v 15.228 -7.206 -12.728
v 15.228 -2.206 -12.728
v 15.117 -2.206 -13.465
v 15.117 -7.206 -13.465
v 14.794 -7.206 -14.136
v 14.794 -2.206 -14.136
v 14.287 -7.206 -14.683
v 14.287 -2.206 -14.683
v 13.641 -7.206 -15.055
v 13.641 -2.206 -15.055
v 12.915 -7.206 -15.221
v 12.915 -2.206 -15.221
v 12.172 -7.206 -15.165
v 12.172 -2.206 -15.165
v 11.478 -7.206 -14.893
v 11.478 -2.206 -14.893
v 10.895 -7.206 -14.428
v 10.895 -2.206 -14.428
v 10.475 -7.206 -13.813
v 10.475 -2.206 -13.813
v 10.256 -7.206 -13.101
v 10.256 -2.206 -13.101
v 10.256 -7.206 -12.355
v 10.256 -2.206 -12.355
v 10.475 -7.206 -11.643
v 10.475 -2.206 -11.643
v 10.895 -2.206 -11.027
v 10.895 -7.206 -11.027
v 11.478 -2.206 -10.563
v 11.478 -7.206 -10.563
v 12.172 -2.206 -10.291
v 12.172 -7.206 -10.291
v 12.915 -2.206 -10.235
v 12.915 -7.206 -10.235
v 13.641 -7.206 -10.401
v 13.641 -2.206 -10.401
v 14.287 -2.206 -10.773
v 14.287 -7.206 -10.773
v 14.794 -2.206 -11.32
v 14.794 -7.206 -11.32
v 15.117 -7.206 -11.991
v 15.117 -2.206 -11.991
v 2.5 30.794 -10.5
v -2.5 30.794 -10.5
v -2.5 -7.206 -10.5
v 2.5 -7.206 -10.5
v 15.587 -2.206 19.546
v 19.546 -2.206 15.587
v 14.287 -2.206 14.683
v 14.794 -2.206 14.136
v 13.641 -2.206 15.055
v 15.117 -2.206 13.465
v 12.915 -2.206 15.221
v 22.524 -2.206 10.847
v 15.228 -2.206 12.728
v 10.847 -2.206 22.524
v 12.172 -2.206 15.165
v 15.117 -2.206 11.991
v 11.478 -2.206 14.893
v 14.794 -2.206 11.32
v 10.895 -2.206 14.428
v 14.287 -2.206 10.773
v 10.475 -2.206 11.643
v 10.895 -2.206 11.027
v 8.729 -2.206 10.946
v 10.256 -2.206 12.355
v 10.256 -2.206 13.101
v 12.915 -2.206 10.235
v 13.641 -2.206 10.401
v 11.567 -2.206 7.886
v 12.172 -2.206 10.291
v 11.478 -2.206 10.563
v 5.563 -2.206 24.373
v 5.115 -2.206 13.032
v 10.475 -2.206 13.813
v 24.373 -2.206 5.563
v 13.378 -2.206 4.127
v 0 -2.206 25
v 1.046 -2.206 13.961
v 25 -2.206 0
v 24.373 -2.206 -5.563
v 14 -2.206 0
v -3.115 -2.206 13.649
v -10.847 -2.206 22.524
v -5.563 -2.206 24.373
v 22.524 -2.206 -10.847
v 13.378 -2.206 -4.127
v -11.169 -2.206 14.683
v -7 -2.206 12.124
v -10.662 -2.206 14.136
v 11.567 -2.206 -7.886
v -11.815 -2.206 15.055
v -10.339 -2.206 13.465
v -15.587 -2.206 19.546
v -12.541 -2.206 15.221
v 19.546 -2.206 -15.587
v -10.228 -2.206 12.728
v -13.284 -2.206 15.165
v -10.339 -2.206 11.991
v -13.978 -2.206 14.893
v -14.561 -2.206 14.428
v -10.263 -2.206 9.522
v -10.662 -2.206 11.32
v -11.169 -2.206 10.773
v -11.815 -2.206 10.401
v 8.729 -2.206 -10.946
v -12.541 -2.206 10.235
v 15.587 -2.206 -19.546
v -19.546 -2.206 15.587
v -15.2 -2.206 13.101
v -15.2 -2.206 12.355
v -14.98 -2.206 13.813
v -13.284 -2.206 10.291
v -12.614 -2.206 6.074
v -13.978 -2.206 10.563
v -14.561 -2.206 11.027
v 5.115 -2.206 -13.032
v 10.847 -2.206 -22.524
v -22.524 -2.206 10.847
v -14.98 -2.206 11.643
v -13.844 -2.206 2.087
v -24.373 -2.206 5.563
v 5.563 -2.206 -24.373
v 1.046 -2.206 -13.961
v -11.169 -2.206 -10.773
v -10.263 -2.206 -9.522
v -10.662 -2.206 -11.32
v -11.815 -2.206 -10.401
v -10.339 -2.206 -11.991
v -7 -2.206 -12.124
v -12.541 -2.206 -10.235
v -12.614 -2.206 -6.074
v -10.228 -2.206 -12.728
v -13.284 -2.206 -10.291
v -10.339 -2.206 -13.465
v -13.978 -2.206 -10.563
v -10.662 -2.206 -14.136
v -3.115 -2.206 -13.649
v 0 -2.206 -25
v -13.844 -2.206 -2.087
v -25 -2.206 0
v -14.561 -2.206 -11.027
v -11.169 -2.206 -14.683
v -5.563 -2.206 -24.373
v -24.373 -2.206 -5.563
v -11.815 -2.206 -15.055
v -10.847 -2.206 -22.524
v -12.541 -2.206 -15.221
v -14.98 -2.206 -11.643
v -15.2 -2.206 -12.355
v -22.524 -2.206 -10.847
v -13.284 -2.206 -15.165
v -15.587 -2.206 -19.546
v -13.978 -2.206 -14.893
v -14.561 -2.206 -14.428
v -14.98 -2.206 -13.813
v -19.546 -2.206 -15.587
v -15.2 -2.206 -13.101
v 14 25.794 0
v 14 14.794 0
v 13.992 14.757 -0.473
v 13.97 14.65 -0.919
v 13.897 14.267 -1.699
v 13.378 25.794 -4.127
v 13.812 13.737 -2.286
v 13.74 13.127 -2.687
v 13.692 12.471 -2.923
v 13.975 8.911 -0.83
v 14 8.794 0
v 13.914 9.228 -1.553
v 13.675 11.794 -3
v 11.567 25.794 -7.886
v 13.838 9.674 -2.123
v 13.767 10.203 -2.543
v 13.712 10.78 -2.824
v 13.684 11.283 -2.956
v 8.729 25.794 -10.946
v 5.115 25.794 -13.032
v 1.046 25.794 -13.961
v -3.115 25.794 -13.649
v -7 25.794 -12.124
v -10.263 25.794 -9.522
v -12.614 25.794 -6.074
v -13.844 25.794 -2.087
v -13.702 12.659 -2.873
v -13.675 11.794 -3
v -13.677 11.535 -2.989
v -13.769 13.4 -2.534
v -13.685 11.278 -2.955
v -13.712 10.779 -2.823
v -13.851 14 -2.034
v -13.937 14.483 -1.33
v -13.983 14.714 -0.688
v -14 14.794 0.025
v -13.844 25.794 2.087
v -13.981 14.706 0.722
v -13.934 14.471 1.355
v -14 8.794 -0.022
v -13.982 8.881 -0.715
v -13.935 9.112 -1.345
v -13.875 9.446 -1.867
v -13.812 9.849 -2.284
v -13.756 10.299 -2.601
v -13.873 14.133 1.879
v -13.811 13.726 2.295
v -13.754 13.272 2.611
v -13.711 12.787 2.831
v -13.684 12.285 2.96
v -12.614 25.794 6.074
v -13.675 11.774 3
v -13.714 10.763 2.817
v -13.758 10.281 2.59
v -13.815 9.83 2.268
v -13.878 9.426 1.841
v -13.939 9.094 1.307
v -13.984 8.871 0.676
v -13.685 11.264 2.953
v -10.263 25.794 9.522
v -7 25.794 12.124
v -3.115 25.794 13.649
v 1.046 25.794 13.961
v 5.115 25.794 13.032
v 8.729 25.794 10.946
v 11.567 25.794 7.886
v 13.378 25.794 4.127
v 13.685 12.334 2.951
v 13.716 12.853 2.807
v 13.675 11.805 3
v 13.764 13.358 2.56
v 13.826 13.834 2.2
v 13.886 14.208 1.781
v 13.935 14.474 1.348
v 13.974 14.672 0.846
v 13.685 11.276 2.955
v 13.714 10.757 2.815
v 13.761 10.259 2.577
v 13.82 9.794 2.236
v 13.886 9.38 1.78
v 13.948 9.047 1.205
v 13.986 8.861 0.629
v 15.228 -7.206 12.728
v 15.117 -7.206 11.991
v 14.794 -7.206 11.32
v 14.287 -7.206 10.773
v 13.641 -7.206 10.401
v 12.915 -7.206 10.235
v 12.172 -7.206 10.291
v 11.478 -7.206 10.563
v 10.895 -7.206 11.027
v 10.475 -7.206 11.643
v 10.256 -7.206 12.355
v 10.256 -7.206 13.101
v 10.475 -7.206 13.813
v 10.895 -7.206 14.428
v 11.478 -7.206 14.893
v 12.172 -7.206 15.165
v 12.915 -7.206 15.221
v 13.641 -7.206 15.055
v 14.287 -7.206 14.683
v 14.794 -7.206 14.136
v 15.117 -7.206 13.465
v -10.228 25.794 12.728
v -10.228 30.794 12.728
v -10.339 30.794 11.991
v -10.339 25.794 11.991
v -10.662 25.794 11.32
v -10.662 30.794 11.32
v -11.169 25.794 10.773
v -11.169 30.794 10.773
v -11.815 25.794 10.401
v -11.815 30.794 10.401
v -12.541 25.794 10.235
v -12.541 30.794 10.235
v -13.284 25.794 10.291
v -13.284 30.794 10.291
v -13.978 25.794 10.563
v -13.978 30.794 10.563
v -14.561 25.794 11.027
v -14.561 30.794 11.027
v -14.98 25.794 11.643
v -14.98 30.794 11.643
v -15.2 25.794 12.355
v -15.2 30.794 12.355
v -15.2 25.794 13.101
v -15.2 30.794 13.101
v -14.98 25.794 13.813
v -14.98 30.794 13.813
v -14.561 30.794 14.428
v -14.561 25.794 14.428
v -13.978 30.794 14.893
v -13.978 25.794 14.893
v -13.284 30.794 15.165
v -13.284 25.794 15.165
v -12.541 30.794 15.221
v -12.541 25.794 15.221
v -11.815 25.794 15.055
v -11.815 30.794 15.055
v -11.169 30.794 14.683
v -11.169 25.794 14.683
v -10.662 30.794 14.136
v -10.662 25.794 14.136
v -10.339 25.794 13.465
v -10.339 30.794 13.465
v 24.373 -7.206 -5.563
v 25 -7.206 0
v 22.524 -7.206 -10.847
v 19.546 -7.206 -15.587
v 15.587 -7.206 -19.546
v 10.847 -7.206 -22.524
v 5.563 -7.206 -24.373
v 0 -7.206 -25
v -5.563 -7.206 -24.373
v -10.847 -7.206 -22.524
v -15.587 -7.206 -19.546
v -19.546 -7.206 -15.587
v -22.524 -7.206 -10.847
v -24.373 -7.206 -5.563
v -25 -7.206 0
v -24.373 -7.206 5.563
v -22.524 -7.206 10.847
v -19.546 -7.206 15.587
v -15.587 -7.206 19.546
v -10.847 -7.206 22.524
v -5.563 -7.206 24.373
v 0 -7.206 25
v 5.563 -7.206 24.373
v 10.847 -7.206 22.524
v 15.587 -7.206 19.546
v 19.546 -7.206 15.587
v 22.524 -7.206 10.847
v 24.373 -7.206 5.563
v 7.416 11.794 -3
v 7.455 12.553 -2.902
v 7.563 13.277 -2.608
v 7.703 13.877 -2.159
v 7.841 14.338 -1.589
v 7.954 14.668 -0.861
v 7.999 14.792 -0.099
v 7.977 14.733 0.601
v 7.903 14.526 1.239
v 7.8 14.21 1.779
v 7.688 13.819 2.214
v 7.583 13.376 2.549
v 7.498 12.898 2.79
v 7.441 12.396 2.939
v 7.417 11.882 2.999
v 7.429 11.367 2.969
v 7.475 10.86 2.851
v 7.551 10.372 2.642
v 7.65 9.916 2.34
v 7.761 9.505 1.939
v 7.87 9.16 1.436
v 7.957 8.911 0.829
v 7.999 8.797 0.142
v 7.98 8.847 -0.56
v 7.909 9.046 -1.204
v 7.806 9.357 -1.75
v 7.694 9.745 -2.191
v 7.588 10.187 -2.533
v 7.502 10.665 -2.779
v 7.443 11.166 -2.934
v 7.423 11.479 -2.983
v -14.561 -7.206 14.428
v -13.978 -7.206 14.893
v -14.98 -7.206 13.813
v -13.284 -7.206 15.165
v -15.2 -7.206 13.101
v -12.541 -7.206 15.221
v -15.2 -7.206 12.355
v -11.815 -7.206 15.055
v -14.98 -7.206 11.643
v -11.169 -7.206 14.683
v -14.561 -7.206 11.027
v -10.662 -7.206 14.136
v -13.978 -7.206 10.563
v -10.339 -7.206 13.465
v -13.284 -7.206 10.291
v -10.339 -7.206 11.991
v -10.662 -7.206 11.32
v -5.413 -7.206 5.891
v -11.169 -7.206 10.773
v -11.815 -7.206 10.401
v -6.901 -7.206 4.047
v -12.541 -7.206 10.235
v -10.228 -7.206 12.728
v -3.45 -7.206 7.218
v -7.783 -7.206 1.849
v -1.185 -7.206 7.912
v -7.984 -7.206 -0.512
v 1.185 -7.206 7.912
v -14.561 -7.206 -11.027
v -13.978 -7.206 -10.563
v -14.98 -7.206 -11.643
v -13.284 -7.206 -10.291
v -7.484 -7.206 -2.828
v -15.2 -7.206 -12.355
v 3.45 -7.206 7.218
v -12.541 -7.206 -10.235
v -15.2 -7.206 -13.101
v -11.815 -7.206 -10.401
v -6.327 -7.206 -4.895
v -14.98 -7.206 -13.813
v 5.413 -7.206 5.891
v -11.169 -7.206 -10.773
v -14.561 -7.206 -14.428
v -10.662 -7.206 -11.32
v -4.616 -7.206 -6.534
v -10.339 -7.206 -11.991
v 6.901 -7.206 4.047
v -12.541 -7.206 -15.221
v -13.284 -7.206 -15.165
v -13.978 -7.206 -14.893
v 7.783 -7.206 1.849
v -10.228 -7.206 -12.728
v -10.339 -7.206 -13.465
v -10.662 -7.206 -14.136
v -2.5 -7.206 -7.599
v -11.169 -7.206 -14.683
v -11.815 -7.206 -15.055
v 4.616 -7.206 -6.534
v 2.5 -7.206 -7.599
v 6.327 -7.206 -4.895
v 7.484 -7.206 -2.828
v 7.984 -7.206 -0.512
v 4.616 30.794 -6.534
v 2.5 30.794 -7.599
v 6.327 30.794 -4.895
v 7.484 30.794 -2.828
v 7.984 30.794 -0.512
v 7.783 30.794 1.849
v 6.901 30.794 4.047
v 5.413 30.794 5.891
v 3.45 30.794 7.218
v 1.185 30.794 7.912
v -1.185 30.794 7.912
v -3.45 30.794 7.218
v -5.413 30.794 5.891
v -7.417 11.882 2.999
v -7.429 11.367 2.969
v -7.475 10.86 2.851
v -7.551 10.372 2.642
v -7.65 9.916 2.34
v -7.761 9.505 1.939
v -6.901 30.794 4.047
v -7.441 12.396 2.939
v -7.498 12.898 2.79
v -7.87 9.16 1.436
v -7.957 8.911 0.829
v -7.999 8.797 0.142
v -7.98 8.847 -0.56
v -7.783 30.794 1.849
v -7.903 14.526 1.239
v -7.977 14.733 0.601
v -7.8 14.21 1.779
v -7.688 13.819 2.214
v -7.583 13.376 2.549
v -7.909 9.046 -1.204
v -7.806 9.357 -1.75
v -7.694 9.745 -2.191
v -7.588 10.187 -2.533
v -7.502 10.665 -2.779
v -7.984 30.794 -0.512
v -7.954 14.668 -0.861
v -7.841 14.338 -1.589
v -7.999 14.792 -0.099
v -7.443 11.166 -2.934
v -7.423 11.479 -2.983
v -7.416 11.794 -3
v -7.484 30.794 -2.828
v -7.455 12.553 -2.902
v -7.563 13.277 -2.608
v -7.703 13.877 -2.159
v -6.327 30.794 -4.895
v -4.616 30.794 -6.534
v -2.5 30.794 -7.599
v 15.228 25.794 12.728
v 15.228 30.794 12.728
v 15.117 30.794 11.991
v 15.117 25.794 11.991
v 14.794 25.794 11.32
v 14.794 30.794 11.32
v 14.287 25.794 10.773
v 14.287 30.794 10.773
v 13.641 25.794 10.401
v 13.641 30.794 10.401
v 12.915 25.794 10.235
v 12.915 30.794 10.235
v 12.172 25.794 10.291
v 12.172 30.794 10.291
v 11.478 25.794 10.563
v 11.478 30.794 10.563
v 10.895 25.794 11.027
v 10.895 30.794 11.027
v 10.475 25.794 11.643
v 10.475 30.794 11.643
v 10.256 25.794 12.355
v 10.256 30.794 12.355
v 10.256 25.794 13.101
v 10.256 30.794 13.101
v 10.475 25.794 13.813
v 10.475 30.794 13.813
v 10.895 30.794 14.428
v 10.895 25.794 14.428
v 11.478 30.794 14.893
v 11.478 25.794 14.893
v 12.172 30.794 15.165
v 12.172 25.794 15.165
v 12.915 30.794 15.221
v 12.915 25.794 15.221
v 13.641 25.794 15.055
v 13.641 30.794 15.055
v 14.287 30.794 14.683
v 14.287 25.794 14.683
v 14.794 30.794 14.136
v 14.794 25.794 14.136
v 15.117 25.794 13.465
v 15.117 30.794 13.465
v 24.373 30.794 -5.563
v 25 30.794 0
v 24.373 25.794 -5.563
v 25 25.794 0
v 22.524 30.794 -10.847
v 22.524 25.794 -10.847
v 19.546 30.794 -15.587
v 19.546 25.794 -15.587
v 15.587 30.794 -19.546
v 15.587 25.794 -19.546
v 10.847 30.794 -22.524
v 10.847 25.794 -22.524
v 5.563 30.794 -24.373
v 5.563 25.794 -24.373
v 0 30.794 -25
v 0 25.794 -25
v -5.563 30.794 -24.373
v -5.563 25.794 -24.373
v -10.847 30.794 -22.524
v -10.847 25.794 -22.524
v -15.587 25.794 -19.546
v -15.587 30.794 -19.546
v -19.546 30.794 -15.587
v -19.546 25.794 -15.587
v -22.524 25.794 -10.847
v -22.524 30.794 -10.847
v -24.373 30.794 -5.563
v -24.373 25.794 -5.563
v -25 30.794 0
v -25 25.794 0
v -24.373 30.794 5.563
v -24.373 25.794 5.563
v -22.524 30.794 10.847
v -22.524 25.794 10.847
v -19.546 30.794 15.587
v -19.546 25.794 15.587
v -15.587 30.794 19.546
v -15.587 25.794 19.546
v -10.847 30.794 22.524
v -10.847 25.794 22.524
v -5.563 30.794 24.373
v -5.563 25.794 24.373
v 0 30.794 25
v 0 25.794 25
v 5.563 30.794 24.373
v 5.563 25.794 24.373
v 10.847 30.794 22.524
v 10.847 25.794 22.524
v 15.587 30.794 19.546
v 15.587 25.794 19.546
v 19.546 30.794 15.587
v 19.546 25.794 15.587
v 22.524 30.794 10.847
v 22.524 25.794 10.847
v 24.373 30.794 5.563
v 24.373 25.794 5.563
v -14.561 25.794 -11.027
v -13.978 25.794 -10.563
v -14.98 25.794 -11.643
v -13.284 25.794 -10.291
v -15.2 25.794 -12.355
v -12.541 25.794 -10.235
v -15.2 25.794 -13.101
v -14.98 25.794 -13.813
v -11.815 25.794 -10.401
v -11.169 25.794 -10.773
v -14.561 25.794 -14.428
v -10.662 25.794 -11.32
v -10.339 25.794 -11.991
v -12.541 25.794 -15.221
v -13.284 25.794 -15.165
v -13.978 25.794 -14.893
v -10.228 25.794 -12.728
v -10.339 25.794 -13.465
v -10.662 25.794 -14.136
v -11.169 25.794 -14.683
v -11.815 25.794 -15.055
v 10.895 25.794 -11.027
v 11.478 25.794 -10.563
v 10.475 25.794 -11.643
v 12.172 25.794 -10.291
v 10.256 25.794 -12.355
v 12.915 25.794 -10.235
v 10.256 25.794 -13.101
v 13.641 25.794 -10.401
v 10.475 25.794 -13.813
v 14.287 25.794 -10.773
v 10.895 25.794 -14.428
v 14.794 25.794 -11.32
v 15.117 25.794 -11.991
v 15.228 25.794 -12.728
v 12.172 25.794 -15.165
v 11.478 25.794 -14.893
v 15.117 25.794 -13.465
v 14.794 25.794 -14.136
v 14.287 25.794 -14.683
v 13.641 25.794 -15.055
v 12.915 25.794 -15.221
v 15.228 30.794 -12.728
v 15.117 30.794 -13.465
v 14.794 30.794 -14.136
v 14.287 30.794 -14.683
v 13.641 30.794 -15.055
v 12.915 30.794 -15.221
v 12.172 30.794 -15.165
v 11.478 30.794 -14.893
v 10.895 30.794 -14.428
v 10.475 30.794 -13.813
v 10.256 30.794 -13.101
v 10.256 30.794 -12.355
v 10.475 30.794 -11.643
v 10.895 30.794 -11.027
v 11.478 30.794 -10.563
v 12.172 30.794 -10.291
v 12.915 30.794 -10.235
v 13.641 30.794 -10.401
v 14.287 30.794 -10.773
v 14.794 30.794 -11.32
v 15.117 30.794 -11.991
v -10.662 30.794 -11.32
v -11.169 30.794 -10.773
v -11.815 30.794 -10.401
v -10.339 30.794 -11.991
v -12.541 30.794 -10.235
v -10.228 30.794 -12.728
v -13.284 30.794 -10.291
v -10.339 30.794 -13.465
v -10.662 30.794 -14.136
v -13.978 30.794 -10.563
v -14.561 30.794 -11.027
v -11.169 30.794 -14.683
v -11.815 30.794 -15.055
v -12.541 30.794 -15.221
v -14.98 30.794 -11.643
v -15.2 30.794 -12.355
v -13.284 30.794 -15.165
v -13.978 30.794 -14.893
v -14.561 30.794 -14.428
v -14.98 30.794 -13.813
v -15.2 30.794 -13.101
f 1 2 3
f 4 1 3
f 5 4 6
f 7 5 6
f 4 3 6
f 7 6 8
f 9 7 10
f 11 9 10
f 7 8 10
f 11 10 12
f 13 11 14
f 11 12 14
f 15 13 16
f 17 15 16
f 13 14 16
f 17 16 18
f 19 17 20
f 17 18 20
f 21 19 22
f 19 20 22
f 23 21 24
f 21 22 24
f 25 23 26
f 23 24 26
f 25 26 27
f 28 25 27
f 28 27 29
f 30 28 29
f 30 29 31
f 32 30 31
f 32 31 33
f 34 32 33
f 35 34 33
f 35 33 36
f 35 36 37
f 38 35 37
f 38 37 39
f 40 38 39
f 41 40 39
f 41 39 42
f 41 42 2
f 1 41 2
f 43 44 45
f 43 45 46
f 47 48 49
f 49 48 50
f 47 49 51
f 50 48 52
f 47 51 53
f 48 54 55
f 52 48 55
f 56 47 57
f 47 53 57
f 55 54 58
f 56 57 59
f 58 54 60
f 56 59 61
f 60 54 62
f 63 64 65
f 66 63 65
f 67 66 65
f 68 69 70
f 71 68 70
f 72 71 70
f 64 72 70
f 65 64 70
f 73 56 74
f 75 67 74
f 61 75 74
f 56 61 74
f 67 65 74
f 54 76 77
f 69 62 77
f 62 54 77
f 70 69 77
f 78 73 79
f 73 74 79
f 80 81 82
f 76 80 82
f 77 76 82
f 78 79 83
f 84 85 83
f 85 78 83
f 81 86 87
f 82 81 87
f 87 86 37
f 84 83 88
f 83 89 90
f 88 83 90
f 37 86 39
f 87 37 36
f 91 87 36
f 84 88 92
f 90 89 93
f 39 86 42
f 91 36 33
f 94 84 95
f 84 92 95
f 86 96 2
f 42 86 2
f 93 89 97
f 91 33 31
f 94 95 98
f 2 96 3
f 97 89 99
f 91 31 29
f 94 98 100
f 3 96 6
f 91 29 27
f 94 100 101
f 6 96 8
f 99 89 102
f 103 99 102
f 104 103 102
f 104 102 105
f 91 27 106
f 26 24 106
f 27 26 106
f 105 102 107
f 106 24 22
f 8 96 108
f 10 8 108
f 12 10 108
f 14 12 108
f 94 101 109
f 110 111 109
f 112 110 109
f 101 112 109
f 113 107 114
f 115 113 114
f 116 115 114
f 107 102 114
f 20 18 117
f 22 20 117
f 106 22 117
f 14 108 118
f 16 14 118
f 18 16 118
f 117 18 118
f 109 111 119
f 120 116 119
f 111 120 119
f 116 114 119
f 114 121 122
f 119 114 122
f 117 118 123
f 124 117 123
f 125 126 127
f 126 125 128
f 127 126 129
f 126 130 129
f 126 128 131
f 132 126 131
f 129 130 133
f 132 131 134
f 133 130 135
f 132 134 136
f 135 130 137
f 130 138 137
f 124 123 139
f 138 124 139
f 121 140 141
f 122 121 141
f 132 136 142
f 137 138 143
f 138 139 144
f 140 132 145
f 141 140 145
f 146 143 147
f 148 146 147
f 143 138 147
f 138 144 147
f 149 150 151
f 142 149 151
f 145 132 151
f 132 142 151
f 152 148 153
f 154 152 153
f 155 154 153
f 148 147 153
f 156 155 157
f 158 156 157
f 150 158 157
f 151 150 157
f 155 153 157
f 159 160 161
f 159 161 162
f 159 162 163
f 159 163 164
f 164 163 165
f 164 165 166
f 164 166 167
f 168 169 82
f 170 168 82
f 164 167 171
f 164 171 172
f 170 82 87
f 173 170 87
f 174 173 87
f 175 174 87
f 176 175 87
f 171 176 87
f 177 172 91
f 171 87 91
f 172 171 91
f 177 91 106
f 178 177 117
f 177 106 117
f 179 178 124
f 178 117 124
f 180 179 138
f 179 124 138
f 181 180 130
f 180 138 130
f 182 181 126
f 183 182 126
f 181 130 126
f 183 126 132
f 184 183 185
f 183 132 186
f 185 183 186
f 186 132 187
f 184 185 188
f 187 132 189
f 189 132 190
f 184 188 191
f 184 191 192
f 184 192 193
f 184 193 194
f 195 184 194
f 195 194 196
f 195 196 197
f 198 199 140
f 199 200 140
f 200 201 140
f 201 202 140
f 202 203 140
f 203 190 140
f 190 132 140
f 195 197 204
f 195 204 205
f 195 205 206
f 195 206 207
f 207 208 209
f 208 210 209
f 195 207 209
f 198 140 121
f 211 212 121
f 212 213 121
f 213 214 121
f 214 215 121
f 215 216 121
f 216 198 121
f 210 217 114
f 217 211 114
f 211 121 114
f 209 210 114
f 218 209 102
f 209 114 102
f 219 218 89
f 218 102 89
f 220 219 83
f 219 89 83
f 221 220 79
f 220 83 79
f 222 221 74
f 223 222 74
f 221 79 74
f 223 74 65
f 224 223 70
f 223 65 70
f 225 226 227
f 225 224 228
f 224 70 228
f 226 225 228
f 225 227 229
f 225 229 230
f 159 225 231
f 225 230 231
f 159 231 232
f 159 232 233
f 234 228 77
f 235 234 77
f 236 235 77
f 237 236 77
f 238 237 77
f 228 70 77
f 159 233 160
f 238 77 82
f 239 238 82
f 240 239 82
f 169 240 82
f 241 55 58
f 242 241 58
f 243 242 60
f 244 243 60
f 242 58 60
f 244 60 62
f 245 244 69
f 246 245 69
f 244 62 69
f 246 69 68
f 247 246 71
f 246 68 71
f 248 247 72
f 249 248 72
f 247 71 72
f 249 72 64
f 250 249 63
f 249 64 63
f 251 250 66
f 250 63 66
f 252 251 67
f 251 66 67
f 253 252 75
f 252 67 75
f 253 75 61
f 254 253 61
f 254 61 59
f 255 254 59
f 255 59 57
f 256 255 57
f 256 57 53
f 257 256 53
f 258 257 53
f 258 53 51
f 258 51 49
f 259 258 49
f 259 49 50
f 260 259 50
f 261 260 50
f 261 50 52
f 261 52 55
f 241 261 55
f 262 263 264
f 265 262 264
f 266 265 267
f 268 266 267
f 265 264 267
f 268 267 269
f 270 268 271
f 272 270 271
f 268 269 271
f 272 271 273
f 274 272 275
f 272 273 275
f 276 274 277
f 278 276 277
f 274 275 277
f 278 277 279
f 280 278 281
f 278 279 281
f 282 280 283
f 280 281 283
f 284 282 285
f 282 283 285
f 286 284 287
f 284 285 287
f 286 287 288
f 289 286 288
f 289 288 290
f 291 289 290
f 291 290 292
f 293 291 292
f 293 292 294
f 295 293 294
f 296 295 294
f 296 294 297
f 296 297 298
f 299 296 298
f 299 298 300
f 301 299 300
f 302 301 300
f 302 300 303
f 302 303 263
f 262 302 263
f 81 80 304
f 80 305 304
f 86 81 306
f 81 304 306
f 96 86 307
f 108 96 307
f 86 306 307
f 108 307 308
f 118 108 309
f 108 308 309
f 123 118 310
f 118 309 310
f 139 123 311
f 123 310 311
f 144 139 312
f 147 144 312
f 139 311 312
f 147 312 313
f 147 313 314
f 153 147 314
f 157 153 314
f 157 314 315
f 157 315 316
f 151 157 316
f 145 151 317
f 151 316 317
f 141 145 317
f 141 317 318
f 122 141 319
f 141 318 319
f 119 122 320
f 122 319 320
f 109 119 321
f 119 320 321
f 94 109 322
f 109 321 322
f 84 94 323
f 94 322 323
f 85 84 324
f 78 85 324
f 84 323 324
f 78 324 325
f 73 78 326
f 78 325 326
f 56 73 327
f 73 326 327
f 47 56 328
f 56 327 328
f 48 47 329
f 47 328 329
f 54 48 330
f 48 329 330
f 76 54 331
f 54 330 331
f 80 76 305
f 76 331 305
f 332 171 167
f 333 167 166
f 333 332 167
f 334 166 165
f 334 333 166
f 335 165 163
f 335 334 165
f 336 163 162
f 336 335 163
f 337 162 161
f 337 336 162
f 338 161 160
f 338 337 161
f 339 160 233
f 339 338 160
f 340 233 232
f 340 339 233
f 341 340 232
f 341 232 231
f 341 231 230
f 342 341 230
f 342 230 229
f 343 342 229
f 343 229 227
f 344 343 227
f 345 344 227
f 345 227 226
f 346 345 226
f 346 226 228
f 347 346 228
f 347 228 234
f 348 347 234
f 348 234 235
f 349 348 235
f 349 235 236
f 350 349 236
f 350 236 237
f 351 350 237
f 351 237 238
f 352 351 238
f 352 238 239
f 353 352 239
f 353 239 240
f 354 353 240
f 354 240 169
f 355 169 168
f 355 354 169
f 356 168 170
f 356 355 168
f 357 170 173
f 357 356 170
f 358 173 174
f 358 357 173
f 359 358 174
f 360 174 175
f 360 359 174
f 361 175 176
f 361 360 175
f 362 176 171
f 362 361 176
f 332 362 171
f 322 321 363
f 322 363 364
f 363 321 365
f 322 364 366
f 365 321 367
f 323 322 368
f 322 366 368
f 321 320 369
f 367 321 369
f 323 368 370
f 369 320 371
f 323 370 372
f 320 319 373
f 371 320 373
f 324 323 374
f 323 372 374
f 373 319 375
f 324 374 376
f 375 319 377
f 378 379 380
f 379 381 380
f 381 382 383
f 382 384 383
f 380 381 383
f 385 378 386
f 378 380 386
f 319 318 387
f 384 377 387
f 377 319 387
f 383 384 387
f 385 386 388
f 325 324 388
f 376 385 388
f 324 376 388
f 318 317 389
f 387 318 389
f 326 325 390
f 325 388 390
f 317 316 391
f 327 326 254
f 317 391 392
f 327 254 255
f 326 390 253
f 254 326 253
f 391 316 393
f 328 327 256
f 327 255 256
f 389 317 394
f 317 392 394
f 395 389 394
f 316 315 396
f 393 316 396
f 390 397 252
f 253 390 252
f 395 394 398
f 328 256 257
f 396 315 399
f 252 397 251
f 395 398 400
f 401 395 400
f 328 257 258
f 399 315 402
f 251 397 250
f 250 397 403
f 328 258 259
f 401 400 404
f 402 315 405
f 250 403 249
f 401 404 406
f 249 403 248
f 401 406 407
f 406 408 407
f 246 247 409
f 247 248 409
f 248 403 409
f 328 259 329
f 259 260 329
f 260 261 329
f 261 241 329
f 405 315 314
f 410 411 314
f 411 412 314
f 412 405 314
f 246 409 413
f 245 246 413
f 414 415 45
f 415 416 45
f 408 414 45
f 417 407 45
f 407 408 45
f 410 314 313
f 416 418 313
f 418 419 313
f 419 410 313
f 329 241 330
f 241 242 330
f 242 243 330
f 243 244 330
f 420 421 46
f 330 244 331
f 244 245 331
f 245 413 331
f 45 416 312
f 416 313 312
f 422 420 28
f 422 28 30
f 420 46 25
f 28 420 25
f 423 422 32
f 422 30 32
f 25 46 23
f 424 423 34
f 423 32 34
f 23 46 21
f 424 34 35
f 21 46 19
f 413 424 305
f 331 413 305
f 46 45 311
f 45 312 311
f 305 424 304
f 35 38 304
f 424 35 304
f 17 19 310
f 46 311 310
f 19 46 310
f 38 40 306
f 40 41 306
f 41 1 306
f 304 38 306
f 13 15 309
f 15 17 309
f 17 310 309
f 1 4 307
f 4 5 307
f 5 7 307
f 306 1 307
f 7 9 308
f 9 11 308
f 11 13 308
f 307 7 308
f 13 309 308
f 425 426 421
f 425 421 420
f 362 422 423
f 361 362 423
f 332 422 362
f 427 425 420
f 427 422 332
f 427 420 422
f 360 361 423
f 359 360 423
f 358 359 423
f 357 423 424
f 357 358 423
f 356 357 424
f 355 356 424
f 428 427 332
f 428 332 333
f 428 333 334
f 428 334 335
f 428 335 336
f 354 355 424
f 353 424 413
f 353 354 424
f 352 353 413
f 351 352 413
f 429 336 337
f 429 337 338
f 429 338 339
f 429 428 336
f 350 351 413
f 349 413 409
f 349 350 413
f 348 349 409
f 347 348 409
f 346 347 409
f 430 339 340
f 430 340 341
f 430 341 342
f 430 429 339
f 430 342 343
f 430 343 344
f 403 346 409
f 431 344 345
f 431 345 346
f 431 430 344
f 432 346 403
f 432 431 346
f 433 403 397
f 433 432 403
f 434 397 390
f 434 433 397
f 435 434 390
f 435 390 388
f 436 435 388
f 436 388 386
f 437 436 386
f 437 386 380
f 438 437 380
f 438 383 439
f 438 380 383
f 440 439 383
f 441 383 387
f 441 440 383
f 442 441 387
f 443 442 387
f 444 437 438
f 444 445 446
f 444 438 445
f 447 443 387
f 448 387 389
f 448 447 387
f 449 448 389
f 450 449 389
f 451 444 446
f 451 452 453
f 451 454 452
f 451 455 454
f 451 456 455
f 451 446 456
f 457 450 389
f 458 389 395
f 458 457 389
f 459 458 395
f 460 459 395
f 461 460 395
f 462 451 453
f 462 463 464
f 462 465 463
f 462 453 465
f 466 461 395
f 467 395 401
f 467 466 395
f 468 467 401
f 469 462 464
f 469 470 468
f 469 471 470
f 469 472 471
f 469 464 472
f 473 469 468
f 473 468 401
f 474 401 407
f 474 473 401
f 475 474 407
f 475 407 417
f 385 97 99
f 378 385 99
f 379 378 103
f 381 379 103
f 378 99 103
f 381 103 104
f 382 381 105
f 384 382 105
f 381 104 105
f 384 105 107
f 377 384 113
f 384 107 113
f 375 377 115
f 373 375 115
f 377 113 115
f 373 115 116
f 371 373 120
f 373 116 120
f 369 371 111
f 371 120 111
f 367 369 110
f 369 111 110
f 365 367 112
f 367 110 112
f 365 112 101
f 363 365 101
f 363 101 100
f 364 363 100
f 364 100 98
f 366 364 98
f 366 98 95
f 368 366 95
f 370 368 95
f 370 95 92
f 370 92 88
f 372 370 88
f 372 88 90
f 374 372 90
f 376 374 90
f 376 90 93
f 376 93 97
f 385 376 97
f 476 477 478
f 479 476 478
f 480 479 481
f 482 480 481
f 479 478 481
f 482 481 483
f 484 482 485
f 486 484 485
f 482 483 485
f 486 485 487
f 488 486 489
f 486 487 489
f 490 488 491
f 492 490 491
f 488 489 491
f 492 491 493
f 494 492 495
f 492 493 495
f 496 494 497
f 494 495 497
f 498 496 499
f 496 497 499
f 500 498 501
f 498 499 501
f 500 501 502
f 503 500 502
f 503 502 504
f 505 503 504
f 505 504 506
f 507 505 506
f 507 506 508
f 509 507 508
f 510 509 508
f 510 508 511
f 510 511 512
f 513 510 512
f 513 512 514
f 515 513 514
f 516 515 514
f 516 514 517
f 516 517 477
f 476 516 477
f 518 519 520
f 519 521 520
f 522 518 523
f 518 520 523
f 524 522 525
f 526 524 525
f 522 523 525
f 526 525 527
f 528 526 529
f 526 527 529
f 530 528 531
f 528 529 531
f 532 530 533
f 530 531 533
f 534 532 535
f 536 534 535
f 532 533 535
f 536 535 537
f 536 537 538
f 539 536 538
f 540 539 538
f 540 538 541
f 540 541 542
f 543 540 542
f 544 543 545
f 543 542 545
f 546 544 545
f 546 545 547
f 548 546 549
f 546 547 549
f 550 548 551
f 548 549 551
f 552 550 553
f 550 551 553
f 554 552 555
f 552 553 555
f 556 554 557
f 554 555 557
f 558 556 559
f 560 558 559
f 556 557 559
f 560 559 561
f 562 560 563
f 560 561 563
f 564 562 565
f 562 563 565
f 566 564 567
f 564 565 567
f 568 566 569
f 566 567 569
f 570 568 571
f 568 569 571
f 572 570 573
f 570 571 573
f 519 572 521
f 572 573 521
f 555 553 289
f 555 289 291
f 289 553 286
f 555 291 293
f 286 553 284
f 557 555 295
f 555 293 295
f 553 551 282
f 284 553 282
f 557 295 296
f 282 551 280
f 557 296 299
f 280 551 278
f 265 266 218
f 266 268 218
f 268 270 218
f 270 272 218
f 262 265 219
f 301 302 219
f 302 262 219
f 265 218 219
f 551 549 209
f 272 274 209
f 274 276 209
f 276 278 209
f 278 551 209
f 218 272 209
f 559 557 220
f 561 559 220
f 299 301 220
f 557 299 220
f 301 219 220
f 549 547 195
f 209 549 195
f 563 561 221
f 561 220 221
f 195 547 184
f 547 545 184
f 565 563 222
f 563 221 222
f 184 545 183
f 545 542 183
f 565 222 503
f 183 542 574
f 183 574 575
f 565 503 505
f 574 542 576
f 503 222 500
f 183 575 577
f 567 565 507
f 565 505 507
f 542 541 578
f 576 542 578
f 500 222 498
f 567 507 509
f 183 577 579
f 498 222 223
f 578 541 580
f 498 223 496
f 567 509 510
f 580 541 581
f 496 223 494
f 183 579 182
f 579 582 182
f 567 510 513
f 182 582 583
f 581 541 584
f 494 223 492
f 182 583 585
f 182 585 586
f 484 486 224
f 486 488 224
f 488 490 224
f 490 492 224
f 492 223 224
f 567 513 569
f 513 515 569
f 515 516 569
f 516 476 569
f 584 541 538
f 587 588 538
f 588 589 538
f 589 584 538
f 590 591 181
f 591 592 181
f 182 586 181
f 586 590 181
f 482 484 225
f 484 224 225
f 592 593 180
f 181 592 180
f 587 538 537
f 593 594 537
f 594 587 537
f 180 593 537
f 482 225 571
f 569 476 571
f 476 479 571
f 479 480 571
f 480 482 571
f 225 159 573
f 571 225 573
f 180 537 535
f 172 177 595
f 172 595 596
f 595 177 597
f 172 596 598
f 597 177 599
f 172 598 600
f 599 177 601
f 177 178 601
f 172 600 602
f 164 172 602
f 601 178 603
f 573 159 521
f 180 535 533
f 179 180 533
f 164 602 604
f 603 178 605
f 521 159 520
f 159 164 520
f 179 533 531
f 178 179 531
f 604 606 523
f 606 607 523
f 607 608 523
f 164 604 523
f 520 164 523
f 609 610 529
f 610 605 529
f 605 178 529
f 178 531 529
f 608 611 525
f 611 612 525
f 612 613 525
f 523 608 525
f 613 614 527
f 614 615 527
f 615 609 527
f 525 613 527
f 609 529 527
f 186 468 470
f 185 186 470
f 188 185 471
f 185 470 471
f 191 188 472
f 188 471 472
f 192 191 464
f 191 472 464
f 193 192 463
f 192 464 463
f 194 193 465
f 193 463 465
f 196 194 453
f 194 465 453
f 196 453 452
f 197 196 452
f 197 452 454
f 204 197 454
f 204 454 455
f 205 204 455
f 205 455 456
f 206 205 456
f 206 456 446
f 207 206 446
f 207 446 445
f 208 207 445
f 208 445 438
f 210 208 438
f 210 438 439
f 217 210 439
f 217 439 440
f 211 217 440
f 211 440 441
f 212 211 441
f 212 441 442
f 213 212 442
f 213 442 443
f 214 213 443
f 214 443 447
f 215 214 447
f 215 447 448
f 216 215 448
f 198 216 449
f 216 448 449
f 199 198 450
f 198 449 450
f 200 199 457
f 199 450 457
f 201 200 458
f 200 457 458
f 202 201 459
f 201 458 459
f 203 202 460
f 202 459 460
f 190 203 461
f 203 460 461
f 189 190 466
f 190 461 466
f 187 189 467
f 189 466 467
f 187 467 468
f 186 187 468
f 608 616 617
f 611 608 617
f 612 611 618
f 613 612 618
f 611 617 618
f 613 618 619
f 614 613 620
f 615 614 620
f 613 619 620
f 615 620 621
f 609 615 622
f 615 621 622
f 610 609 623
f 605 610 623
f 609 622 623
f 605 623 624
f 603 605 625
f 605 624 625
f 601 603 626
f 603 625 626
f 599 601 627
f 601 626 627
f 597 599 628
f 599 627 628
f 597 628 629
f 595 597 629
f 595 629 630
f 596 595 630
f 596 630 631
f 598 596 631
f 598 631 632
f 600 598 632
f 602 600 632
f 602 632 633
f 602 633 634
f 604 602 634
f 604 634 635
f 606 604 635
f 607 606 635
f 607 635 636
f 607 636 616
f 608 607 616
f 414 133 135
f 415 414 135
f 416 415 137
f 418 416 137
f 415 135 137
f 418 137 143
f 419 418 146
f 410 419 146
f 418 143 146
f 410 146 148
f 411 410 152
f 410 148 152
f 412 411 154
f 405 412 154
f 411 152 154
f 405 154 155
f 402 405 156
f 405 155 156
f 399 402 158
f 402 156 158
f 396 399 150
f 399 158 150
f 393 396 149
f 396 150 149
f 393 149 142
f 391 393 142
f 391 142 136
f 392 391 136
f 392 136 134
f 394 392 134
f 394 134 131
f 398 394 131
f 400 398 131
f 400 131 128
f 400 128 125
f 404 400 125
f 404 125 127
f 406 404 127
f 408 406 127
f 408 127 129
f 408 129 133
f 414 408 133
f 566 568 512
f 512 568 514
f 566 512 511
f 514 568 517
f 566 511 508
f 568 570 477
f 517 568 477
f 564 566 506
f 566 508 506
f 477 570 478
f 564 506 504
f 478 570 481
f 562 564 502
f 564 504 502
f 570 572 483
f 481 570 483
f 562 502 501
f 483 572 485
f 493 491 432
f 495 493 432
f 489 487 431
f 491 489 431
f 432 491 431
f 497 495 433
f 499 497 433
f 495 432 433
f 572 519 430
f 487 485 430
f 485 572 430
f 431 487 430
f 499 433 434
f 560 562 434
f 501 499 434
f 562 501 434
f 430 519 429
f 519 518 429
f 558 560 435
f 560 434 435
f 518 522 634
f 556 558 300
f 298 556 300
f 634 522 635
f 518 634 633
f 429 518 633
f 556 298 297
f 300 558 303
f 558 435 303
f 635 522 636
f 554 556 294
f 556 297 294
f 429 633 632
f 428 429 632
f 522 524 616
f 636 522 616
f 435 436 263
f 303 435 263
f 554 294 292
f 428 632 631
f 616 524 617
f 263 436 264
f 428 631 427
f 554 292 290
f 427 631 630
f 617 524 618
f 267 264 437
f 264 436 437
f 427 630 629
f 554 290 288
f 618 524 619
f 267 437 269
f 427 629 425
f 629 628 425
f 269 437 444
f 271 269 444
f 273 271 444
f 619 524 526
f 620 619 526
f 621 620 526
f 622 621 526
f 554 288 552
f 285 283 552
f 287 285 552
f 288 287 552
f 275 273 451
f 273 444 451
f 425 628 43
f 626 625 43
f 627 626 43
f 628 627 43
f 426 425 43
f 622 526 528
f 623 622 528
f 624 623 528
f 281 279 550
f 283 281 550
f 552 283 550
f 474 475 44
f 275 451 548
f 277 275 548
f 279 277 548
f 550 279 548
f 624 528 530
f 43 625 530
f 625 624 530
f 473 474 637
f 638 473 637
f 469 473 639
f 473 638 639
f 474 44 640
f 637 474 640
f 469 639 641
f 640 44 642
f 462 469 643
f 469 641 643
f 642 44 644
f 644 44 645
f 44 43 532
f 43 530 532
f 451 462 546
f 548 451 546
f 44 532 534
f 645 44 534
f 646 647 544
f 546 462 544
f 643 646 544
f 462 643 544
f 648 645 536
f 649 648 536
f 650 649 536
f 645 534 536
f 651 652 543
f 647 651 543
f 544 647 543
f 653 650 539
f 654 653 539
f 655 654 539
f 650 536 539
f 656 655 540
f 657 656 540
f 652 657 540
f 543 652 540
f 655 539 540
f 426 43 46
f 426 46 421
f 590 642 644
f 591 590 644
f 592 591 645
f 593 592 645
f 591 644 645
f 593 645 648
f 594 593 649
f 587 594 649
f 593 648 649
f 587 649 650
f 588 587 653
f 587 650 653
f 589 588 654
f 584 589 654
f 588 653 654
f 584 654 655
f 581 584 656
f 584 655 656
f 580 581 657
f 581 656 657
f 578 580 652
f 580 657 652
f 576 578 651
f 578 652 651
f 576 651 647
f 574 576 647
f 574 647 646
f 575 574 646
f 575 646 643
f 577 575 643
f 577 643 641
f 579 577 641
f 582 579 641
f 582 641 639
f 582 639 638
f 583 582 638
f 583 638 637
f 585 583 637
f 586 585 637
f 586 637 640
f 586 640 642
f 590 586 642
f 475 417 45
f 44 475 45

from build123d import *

# Parameters (mm, degrees)
SKETCH2_R               = 2.5
CUT_EXTRUDE1_DEPTH      = 39
SKETCH3_R               = 3
CUT_EXTRUDE2_DEPTH      = 26
CUT_EXTRUDE2_DEPTH_BACK = 26


with BuildPart() as part:
    # Sketch1 → Revolve1 (revolve)
    with BuildSketch(Plane.XY):
        Polygon((0, 30.794117647), (25, 30.794117647), (25, 25.794117647), (14, 25.794117647), (14, -2.205882353), (25, -2.205882353), (25, -7.205882353), (0, -7.205882353), align=None)
    revolve(axis=Axis((0, -19.166666667, 0), (0, 1, 0)))

    # Sketch2 → Cut-Extrude1 (cut, through all)
    with BuildSketch(Plane(origin=(0, 30.794117647, 0), x_dir=(1, 0, 0), z_dir=(0, 1, 0))):
        with Locations((12.727922061, 12.727922061)):
            Circle(SKETCH2_R)
        with Locations((12.727922061, -12.727922061)):
            Circle(SKETCH2_R)
        with Locations((-12.727922061, -12.727922061)):
            Circle(SKETCH2_R)
        with Locations((-12.727922061, 12.727922061)):
            Circle(SKETCH2_R)
        with BuildLine():
            Line((-2.5, 7.599342077), (-2.5, 10.5))
            Line((-2.5, 10.5), (2.5, 10.5))
            Line((2.5, 10.5), (2.5, 7.599342077))
            ThreePointArc((2.5, 7.599342077), (0, -8), (-2.5, 7.599342077))
        make_face()
    extrude(amount=-CUT_EXTRUDE1_DEPTH, mode=Mode.SUBTRACT)

    # Sketch3 → Cut-Extrude2 (cut, two sides)
    with BuildSketch(Plane(origin=(0, 0, 0), x_dir=(0, 0, -1), z_dir=(1, 0, 0))) as cut_extrude2_sk:
        with Locations((0, 11.794117647)):
            Circle(SKETCH3_R)
    extrude(amount=CUT_EXTRUDE2_DEPTH, mode=Mode.SUBTRACT)
    extrude(cut_extrude2_sk.sketch, amount=-CUT_EXTRUDE2_DEPTH_BACK, mode=Mode.SUBTRACT)


solid = part.part
